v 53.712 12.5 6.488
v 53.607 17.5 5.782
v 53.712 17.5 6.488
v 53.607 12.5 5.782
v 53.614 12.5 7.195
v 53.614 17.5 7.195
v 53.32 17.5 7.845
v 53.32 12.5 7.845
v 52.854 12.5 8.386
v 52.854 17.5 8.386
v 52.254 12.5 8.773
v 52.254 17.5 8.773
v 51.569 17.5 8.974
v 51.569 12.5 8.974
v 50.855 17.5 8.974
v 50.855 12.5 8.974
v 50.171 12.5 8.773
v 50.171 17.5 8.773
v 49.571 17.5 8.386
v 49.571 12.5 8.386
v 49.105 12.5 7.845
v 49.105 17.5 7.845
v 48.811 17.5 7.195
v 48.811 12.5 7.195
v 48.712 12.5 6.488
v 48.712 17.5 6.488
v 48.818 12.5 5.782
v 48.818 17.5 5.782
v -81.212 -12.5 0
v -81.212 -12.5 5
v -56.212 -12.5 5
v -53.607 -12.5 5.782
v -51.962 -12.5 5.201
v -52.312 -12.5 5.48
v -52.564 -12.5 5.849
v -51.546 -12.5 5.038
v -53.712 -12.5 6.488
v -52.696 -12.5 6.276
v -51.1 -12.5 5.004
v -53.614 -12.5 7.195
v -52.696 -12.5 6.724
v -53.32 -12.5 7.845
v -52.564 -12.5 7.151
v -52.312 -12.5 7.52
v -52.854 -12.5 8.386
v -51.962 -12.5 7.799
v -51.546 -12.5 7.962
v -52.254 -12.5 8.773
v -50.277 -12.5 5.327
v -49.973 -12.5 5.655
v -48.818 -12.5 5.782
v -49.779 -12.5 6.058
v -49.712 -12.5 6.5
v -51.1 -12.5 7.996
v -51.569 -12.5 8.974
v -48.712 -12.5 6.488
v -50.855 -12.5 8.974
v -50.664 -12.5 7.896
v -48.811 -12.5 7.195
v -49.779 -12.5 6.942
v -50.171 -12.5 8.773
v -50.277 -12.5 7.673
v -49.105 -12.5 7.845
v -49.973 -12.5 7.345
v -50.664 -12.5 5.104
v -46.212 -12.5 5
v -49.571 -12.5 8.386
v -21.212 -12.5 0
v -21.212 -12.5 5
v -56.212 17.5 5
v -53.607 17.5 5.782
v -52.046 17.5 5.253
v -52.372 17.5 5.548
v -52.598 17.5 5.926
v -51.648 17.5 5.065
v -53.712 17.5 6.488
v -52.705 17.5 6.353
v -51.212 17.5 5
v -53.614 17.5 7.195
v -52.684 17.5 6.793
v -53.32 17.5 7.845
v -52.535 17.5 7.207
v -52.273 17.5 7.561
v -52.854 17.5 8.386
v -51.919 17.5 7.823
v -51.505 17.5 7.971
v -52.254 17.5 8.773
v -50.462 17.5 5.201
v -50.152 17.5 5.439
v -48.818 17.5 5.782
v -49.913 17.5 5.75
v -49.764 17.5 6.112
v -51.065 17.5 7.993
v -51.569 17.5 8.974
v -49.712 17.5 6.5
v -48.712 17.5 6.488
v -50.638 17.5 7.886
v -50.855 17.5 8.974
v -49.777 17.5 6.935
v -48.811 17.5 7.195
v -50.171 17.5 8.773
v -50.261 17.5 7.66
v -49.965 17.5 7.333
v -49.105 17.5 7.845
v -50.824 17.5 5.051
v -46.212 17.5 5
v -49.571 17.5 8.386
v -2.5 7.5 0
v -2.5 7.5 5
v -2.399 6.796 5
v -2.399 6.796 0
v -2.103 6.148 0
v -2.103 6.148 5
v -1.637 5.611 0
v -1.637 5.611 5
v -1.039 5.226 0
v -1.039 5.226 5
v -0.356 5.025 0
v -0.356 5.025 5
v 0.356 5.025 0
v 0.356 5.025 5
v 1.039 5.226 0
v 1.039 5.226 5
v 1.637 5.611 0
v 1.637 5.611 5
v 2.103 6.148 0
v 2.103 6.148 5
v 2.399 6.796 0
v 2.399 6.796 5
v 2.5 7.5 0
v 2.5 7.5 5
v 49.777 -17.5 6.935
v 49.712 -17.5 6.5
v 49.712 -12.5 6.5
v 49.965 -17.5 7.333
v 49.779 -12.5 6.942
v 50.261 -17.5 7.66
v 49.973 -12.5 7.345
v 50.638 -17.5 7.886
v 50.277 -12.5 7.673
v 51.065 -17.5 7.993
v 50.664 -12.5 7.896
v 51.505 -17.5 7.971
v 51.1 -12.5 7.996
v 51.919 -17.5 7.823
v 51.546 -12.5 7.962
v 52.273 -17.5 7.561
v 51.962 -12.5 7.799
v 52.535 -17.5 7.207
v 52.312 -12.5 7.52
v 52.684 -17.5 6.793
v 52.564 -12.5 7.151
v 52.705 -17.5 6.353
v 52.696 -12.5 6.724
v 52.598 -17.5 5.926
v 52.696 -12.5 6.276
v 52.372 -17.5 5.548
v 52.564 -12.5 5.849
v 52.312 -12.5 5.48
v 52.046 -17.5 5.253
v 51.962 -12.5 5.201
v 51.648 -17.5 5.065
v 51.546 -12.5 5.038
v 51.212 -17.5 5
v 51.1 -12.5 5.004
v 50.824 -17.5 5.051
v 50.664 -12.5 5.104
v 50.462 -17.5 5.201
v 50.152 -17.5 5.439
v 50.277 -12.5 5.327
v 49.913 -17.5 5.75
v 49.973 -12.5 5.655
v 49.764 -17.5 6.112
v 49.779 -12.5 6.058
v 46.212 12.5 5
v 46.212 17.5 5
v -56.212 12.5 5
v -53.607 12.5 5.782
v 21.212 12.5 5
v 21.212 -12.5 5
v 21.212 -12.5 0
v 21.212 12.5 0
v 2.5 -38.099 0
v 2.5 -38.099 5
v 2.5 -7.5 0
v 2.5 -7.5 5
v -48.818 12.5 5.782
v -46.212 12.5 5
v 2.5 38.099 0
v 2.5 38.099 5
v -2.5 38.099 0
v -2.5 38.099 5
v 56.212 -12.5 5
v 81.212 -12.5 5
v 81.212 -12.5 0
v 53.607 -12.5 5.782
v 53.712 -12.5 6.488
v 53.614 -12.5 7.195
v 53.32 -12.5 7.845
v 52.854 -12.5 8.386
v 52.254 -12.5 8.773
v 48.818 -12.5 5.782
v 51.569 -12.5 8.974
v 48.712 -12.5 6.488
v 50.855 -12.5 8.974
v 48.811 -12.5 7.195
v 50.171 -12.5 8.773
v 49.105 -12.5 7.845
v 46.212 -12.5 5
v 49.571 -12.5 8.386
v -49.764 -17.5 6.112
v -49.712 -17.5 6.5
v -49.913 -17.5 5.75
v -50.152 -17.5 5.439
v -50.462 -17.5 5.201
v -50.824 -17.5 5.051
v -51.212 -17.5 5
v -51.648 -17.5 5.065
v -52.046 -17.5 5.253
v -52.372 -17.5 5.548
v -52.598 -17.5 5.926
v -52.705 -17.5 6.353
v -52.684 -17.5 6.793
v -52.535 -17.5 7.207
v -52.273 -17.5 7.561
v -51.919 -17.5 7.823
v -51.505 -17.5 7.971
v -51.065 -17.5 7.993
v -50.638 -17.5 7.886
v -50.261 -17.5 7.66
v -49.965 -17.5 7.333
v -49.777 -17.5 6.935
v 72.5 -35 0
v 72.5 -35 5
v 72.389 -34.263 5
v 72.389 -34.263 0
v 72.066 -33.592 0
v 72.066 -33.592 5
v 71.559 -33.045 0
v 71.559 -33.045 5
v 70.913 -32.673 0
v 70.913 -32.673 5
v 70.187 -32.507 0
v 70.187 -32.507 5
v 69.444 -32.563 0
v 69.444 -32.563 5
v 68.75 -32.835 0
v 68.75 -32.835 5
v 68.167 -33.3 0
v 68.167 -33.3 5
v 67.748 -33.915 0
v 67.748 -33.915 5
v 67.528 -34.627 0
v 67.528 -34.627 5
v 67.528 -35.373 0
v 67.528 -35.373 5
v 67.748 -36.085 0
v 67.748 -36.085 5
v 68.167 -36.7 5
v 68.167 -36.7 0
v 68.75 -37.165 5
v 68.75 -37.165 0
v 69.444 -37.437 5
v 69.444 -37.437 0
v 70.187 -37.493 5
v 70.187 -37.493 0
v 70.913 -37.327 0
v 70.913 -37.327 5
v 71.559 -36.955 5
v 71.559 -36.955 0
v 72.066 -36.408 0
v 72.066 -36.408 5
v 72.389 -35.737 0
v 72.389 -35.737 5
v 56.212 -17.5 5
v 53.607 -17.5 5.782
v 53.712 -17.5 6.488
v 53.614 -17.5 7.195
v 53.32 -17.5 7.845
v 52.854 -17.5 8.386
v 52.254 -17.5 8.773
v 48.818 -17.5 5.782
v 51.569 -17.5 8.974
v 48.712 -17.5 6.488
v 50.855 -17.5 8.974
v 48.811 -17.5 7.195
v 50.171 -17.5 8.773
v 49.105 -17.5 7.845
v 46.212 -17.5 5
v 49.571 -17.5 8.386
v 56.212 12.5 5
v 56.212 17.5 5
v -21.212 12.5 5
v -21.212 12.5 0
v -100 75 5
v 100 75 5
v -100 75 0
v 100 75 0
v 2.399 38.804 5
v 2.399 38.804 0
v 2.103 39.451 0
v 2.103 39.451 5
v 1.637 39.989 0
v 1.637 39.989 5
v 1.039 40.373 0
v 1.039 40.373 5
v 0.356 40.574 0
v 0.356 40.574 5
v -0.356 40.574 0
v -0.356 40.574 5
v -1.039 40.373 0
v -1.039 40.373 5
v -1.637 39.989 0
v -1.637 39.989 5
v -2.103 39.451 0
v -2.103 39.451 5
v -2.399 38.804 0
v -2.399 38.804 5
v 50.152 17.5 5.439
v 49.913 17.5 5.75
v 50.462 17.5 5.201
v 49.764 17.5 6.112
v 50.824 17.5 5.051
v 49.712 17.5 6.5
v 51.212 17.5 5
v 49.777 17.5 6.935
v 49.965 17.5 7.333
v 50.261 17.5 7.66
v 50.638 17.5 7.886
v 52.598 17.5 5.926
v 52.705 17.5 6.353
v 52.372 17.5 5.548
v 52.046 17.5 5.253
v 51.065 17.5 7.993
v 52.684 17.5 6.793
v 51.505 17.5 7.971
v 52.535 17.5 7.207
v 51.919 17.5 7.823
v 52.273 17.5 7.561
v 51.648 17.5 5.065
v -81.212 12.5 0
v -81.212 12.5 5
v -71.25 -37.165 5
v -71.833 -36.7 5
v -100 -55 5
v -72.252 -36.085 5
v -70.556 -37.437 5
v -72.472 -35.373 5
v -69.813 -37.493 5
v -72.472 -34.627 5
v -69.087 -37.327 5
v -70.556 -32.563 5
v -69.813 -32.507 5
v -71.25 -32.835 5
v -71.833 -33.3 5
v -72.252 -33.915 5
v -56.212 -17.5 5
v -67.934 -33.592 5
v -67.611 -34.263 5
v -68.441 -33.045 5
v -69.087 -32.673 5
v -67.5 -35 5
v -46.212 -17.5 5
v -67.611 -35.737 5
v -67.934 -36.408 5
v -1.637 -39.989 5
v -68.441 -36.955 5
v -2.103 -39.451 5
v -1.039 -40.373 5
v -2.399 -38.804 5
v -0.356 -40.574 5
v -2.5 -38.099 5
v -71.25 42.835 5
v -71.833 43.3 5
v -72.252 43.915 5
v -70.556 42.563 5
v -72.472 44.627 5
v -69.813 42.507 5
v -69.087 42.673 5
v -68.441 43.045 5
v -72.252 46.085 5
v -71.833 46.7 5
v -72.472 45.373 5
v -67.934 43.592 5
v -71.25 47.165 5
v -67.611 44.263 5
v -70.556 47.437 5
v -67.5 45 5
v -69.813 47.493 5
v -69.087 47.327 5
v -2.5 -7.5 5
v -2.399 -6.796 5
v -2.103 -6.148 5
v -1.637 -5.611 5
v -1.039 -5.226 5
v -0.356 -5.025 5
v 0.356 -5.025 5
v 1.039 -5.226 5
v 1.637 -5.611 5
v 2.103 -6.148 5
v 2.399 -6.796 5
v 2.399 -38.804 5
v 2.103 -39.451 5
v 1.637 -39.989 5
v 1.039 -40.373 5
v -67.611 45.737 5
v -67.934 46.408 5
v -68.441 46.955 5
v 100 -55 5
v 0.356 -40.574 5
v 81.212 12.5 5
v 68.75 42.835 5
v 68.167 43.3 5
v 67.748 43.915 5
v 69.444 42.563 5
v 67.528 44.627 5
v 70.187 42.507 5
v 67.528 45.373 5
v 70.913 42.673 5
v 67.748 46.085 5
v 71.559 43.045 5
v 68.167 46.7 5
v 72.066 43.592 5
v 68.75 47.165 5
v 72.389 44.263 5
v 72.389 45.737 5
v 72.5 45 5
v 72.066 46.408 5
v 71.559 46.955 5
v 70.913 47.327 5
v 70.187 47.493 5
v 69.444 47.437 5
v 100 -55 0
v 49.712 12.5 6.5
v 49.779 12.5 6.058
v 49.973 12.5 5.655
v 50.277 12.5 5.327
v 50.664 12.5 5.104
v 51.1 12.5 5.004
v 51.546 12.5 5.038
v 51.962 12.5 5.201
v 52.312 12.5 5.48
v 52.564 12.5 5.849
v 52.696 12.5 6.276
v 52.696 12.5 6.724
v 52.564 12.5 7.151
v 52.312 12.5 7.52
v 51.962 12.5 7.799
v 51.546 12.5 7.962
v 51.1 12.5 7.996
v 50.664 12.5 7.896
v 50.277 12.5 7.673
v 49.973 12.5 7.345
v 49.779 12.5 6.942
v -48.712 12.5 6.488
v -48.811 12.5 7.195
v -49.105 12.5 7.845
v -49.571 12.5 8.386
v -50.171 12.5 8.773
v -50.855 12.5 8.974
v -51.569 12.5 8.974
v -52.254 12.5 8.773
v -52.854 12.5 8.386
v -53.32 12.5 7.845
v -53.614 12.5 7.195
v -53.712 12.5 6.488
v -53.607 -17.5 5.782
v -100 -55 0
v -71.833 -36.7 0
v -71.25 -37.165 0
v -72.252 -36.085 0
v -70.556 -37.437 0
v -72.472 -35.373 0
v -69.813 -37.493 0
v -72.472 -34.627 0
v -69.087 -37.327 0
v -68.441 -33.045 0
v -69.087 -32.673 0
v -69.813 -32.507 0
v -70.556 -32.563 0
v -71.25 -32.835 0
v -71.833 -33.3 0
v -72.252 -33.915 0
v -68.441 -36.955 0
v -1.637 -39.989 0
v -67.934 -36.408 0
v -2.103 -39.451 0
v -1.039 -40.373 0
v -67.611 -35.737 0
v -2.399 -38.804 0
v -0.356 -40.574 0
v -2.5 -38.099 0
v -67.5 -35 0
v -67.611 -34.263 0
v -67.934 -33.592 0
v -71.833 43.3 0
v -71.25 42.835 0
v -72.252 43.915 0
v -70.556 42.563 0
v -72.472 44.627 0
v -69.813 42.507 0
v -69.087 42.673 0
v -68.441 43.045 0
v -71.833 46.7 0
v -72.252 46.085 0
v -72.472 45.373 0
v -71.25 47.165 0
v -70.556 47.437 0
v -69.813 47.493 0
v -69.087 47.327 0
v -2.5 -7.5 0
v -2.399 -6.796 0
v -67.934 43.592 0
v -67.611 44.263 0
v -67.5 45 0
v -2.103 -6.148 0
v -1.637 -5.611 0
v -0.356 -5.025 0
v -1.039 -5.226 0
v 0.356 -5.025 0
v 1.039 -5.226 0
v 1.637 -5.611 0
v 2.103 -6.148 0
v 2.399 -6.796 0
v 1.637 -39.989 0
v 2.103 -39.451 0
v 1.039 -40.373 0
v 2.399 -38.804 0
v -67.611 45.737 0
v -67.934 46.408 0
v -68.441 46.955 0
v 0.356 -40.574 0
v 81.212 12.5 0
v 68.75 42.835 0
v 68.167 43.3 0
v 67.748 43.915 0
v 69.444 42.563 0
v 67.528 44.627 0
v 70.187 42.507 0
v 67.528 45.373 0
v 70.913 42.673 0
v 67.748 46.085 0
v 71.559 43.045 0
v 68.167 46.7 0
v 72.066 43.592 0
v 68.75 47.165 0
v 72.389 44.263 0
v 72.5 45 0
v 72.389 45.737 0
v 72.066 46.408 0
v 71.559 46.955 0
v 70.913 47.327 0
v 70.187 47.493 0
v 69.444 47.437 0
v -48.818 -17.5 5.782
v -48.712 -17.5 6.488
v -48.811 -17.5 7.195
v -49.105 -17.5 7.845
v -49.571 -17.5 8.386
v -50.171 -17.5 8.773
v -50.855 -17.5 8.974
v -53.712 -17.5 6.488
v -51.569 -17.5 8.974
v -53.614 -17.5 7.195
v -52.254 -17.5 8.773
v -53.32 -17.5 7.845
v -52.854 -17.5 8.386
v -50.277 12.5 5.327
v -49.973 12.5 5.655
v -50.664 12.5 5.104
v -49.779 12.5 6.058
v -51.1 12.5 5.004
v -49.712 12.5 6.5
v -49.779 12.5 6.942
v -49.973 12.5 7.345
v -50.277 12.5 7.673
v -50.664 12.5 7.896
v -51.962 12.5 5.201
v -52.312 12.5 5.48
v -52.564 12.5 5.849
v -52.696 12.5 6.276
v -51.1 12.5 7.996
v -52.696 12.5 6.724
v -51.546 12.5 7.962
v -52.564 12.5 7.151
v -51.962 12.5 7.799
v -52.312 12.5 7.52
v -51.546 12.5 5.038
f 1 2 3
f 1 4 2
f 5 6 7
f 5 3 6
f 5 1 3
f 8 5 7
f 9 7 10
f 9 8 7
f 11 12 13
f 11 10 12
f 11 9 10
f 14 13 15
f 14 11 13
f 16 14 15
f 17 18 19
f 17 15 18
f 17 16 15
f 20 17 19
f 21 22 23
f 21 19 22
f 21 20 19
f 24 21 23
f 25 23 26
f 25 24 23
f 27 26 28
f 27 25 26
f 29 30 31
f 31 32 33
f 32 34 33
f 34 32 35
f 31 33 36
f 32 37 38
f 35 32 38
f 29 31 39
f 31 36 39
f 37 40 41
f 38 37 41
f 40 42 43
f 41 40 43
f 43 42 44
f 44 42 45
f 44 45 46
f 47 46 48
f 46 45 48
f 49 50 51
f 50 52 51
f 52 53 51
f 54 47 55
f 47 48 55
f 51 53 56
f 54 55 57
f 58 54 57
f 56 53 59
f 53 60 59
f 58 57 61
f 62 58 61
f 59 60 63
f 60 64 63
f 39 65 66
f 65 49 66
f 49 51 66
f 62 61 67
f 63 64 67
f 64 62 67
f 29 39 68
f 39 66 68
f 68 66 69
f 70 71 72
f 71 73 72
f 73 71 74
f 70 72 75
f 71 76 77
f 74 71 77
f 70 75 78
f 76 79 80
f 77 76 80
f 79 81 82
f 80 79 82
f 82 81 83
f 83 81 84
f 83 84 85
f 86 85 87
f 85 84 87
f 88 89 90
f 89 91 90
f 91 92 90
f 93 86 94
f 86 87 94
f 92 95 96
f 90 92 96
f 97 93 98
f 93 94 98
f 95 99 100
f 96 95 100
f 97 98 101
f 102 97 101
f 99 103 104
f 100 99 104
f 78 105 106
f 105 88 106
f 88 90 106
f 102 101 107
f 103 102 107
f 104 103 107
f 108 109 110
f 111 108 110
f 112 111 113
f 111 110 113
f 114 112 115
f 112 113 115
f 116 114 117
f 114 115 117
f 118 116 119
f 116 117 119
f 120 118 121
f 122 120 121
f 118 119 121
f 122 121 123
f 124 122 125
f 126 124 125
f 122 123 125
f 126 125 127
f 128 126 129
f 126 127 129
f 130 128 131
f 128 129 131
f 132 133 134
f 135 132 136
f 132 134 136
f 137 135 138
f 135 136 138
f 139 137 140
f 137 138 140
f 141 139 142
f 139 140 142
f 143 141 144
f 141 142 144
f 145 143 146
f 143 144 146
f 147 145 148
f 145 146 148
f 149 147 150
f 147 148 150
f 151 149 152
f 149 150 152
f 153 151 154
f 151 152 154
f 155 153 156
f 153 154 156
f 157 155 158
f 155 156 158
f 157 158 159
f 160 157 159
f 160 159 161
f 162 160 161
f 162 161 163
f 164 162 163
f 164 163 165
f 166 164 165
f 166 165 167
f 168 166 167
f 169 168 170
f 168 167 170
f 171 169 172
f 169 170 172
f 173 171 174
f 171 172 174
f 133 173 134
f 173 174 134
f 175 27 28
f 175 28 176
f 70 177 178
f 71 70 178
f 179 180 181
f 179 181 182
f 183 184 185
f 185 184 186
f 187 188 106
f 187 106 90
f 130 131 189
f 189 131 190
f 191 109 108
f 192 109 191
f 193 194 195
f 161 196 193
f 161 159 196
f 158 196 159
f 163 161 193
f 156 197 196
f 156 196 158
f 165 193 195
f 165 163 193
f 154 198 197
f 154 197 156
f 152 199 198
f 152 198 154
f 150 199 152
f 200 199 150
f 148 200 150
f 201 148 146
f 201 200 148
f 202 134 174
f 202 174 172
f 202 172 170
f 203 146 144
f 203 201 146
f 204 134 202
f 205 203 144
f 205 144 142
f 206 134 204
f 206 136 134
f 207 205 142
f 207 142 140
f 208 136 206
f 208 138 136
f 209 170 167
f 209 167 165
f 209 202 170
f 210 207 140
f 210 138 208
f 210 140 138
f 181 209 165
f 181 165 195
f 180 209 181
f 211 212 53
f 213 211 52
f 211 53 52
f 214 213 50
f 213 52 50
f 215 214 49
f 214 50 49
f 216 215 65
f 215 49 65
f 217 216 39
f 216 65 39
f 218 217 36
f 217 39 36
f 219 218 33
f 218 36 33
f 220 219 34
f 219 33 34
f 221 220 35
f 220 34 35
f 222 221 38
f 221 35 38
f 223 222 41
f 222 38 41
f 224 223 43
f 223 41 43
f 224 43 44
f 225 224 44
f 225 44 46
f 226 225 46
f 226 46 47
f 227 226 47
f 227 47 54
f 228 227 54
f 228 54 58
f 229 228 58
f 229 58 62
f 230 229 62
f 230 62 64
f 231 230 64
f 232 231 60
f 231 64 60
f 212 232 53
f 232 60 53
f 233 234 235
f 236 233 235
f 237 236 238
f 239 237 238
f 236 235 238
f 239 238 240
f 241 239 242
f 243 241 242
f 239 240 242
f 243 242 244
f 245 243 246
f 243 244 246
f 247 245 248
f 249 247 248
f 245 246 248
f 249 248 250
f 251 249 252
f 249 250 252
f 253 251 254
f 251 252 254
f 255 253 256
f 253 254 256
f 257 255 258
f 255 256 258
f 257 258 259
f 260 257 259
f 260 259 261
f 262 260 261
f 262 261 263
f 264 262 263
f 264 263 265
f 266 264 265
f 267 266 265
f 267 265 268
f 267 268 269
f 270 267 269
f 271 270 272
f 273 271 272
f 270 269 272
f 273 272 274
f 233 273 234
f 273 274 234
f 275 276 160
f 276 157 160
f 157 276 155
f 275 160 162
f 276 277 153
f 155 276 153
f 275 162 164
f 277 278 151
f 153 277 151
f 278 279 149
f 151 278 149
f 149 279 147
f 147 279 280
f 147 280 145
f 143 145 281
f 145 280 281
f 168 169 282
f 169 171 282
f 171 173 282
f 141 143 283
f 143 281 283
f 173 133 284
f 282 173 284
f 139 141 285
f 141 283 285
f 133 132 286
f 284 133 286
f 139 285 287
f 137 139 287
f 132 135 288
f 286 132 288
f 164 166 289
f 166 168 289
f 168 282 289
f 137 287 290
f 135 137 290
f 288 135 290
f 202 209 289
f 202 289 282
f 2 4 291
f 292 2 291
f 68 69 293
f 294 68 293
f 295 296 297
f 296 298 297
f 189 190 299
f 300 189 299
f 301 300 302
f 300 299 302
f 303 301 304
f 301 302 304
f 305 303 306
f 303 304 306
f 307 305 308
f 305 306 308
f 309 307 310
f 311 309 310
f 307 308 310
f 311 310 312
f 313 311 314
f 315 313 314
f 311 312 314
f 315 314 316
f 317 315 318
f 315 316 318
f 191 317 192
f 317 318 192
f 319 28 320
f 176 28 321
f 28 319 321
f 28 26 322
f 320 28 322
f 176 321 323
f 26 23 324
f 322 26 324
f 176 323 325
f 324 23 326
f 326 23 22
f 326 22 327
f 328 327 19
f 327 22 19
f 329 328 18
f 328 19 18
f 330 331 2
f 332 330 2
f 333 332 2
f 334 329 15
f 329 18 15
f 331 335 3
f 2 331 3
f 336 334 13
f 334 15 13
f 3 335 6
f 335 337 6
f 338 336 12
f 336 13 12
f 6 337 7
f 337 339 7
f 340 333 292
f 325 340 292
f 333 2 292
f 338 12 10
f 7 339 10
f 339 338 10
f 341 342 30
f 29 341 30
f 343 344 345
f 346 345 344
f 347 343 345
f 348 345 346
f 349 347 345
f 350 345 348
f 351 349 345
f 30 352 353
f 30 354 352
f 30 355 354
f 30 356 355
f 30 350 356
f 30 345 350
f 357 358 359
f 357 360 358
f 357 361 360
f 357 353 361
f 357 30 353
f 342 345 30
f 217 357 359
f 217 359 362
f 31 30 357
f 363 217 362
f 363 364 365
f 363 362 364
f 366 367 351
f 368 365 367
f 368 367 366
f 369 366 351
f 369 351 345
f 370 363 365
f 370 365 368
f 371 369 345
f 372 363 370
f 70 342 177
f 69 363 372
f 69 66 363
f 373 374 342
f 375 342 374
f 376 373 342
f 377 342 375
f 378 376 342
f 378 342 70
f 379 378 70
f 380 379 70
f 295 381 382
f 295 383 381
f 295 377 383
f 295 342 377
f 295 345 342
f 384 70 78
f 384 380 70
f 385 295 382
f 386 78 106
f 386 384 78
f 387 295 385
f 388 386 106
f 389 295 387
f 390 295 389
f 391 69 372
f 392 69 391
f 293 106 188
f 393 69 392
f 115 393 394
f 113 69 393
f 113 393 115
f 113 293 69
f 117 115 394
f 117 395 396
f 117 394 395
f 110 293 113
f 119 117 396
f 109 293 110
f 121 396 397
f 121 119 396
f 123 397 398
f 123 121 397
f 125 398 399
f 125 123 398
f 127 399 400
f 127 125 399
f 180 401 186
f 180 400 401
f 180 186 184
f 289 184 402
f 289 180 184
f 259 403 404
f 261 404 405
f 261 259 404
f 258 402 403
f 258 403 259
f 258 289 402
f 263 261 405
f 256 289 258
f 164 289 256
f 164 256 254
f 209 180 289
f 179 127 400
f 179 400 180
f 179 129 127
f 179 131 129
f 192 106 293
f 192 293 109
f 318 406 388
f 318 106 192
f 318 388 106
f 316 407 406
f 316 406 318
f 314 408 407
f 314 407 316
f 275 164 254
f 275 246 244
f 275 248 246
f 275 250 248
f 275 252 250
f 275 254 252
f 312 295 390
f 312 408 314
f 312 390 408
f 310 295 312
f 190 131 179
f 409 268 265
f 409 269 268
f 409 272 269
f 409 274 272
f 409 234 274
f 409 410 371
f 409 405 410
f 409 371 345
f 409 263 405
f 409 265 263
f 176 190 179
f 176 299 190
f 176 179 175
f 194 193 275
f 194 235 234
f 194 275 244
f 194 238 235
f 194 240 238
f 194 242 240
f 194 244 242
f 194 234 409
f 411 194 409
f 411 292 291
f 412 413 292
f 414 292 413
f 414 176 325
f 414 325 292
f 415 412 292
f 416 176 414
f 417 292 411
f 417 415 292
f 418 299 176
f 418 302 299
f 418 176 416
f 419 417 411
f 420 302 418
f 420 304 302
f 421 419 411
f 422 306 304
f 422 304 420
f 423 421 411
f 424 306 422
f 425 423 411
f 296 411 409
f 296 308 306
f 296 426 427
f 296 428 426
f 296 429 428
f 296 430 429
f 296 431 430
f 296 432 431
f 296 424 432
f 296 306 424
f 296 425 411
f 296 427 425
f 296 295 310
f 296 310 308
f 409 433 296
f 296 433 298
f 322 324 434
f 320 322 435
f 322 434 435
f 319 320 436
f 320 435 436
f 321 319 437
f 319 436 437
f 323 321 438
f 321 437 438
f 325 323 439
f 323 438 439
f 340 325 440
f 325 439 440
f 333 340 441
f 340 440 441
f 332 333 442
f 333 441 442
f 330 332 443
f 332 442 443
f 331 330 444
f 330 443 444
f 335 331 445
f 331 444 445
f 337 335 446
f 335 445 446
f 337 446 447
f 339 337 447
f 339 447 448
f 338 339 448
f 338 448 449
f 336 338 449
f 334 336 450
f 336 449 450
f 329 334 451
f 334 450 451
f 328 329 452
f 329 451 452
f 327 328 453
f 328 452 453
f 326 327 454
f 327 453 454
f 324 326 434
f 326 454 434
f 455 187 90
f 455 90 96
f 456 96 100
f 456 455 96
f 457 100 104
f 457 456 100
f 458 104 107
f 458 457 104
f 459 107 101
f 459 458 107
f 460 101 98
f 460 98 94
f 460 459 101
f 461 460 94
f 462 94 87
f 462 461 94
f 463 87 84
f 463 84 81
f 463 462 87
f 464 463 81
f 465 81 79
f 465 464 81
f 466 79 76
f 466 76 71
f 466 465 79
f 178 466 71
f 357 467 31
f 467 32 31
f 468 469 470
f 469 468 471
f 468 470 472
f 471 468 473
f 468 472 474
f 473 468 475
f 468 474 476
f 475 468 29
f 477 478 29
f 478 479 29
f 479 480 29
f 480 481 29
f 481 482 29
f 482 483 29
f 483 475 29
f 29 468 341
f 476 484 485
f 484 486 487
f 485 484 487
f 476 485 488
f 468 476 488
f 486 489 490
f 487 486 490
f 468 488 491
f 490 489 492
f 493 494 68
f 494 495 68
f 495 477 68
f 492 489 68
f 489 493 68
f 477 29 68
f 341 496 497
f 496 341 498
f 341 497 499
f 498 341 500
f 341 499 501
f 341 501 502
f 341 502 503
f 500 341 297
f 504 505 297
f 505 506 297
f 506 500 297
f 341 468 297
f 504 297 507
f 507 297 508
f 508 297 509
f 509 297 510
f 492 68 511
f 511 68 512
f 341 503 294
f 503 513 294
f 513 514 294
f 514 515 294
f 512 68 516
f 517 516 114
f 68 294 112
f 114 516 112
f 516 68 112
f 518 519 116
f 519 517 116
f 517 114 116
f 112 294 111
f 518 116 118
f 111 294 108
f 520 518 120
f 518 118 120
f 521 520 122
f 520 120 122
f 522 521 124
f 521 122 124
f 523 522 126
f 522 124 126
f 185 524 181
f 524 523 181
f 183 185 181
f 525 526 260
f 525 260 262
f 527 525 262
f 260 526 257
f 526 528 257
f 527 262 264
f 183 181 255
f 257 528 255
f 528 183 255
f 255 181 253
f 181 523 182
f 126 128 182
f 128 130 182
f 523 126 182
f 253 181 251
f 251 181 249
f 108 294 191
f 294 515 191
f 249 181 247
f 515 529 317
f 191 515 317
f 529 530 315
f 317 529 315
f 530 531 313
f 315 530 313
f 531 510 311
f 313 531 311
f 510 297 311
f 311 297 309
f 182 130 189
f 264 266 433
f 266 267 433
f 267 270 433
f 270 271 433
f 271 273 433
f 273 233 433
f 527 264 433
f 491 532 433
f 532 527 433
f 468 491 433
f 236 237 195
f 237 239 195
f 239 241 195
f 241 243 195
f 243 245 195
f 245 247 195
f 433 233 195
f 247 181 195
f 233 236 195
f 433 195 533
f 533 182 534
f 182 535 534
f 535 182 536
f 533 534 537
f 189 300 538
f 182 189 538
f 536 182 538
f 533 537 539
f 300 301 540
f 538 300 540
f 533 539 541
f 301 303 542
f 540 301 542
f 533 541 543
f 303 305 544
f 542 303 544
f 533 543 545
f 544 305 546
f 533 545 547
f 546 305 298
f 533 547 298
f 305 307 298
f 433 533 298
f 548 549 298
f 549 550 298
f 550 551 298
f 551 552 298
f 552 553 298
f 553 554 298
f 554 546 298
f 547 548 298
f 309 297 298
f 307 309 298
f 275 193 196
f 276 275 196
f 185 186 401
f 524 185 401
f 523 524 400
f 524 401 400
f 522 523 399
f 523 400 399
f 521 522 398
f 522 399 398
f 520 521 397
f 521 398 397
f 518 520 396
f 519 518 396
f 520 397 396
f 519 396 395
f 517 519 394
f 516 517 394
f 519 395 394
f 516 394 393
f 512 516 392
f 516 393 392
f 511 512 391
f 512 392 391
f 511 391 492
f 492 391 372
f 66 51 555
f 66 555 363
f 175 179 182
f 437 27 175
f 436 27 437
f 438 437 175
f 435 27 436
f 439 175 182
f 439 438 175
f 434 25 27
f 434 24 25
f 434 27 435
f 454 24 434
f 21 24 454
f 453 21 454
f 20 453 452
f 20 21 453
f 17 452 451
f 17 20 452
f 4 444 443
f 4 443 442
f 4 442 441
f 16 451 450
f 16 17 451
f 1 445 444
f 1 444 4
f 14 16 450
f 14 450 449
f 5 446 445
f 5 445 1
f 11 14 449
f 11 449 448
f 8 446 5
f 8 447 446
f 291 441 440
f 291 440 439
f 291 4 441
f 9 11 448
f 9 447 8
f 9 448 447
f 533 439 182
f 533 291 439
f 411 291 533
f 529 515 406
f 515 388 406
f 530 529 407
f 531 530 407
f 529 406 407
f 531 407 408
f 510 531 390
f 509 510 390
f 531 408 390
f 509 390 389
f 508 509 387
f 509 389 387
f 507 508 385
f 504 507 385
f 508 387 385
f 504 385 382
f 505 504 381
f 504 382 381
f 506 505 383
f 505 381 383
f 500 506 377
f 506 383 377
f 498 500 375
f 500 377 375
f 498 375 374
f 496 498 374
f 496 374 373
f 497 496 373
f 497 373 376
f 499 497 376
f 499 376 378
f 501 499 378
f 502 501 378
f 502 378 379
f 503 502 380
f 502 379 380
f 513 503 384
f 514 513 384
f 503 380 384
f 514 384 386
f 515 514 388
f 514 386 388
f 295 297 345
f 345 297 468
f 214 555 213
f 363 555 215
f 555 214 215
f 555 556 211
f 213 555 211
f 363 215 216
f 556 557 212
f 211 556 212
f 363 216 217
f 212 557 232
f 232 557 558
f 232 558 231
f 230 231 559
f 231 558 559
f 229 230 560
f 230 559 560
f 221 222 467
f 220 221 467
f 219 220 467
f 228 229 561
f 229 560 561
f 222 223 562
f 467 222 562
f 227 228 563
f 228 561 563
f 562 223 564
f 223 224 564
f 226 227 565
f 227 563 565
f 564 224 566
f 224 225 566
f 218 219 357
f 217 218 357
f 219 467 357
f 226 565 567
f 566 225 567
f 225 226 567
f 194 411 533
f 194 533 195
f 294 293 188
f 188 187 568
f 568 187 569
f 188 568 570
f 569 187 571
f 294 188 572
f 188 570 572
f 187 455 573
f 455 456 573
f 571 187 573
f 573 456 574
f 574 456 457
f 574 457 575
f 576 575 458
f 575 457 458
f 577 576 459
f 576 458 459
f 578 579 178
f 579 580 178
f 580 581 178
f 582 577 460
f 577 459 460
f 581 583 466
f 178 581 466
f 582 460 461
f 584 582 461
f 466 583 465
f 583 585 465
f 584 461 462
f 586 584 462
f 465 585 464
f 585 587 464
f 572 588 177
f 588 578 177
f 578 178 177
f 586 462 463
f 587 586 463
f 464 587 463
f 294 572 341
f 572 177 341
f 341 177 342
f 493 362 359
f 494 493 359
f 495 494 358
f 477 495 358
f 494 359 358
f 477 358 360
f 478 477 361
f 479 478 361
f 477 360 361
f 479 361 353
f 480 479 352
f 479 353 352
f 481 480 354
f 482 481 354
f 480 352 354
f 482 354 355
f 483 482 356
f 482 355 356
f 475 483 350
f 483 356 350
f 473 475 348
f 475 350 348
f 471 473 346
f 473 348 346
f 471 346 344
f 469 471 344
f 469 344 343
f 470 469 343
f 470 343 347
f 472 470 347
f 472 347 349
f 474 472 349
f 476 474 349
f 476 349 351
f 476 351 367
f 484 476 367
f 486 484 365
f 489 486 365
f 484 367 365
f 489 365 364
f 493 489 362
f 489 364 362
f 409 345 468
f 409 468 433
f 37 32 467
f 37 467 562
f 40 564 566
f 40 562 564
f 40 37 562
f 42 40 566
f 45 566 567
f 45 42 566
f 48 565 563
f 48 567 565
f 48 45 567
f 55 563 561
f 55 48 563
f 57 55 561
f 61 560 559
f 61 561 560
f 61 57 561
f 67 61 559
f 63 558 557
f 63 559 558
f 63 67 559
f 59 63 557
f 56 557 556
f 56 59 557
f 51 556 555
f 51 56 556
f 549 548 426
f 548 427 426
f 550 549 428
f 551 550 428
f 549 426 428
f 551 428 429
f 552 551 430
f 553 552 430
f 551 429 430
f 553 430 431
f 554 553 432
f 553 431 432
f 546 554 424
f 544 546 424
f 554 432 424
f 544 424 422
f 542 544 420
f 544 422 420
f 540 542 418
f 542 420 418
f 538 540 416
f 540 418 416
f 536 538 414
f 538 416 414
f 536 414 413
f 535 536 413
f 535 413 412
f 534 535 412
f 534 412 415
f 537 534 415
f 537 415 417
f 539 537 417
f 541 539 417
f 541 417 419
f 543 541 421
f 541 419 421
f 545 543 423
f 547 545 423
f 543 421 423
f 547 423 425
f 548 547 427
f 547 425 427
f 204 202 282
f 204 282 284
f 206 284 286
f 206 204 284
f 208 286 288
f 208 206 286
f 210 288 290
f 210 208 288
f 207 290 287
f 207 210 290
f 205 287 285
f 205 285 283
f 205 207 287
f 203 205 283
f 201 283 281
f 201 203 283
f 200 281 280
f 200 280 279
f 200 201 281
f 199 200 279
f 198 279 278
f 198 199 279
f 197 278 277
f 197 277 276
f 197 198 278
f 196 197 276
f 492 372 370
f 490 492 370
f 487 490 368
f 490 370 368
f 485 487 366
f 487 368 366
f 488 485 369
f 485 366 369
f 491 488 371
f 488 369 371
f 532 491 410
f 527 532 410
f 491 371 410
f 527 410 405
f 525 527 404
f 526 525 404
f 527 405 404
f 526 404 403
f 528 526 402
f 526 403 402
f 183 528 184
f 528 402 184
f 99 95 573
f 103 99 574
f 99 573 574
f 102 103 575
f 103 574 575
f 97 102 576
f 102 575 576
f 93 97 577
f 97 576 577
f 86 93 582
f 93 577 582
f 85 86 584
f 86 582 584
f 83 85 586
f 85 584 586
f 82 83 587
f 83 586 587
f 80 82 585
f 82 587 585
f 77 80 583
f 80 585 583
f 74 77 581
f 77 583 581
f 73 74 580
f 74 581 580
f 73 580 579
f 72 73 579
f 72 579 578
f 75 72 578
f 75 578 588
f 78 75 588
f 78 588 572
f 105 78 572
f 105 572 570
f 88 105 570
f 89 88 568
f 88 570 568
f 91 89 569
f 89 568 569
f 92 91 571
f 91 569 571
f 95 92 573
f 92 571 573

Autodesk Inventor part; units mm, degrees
ref_plane "YZ Plane" through (0, 0, 0) normal (1, 0, 0) x (0, 1, 0)
ref_plane "XZ Plane" through (0, 0, 0) normal (0, 1, 0) x (-1, 0, 0)
sketch "Эскиз1" plane through (0, 0, 0) normal (0, 0, 1) x (1, 0, 0)
  line L0 (-100, -75) -> (100, -75)
  line L1 (100, -75) -> (100, 75)
  line L2 (100, 75) -> (-100, 75)
  line L3 (-100, 75) -> (-100, -75)
  line L4 (-100, -75) -> (100, 75) construction
  line L5 (100, -75) -> (-100, 75) construction
  point P0 (0, 0)
  dimension "d0" = 200
  dimension "d1" = 150
extrude "Выдавливание1" add sketch "Эскиз1" along normal blind 5
sketch "Эскиз2" plane through (0, 0, 5) normal (0, 0, 1) x (1, 0, 0)
  line L0 (-100, -75) -> (100, -75) projected
  line L1 (100, -75) -> (100, 75) projected
  line L2 (100, 75) -> (-100, 75) projected
  line L3 (-100, 75) -> (-100, -75) projected
  line L4 (100, 75) -> (-100, 75) construction
  line L5 (0, 75) -> (0, -75) construction
  line L6 (-100, 0) -> (100, 0) construction
  line L7 (100, -75) -> (100, 75) construction
  line L8 (-100, -12.5) -> (100, -12.5) construction
  line L9 (100, -12.5) -> (100, 12.5) construction
  line L10 (100, 12.5) -> (-100, 12.5) construction
  line L11 (-100, 12.5) -> (-100, -12.5) construction
  line L12 (-100, -12.5) -> (100, 12.5) construction
  line L13 (100, -12.5) -> (-100, 12.5) construction
  line L14 (-100, 0) -> (0, 0) construction
  line L15 (-51.2124, 75) -> (-51.2124, -75) construction
  line L16 (-100, -75) -> (100, -75) construction
  line L17 (0, 0) -> (100, 0) construction
  line L18 (50, 75) -> (50, -75) construction
  line L19 (-81.2124, -12.5) -> (-21.2124, -12.5)
  line L20 (-21.2124, -12.5) -> (-21.2124, 12.5)
  line L21 (-21.2124, 12.5) -> (-81.2124, 12.5)
  line L22 (-81.2124, 12.5) -> (-81.2124, -12.5)
  line L23 (-81.2124, -12.5) -> (-21.2124, 12.5) construction
  line L24 (-21.2124, -12.5) -> (-81.2124, 12.5) construction
  line L25 (81.2124, -12.5) -> (21.2124, -12.5)
  line L26 (21.2124, -12.5) -> (21.2124, 12.5)
  line L27 (21.2124, 12.5) -> (81.2124, 12.5)
  line L28 (81.2124, 12.5) -> (81.2124, -12.5)
  point P0 (-51.2124, 0)
  dimension "d4" = 25
  dimension "d5" = 60
extrude "Выдавливание2" cut sketch "Эскиз2" against normal blind 5 contours L22 L21 L20 L19 | L25 L26 L27 L28
sketch "Эскиз3" plane through (-81.2124, 12.5, 5) normal (0, -1, 0) x (1, 0, 0)
  line L0 (0, 0) -> (60, 0) projected
  line L1 (30, 0) -> (30, 14.9537) construction
  line L2 (30, 0) -> (40, 0) construction
  line L3 (30, 0) -> (35, 0) construction
  line L4 (30, 0) -> (25, 0) construction
  line L5 (25, 0) -> (35, 0) construction
  line L6 (25, 0) -> (35, 0)
  line L7 (30, 0) -> (30, 3) construction
  circle A0 centre (30, 1.5) radius 1.5
  arc A1 (32.3946, 0.7816) -> (27.6054, 0.7816) centre (30, 1.5) ccw
  line L8 (35, 0) -> (32.3946, 0.7816)
  line L9 (25, 0) -> (27.6054, 0.7816)
  point P0 (81.2124, -5)
  dimension "d8" = 10
  dimension "d9" = 5
  dimension "d10" = 5
  dimension "d11" = 3
  dimension "d12" = 1
extrude "Выдавливание3" add sketch "Эскиз3" against normal blind 5
mirror "Зеркальное отражение1" about plane through (0, 0, 0) normal (0, 1, 0) of "Выдавливание3"
sketch "Эскиз4" plane through (-81.2124, 12.5, 0) normal (0, -1, 0) x (1, 0, 0)
  circle A0 centre (30, 6.5) radius 1.5 projected
  point P0 (81.2124, 0)
surface extrude "ВыдавПврх1" sketch "Эскиз4" along normal up to next shown yes curves A0
boundary_patch "Участок поверхности1"
boundary_patch "Участок поверхности2"
ref_plane "РабПлоскость1" through (-81.2124, 0, 0) normal (0, -1, 0) x (1, 0, 0)
sketch "Эскиз6" plane through (0, 0, 5) normal (0, 0, 1) x (1, 0, 0)
  line L0 (81.2124, -12.5) -> (21.2124, -12.5) projected
  line L1 (21.2124, -12.5) -> (21.2124, 12.5) projected
  line L2 (21.2124, 12.5) -> (81.2124, 12.5) projected
  line L3 (81.2124, 12.5) -> (81.2124, -12.5) projected
  line L4 (-100, -75) -> (100, -75) projected
  line L5 (100, -75) -> (100, 75) projected
  line L6 (100, 75) -> (-100, 75) projected
  line L7 (-100, 75) -> (-100, -75) projected
  line L8 (-46.2124, -12.5) -> (-46.2124, -17.5) projected
  line L9 (-46.2124, -17.5) -> (-51.2124, -17.5) projected
  line L10 (-51.2124, -17.5) -> (-56.2124, -17.5) projected
  line L11 (-56.2124, -17.5) -> (-56.2124, -12.5) projected
  line L12 (-56.2124, -12.5) -> (-81.2124, -12.5) projected
  line L13 (-81.2124, -12.5) -> (-81.2124, 12.5) projected
  line L14 (-81.2124, 12.5) -> (-56.2124, 12.5) projected
  line L15 (-56.2124, 12.5) -> (-56.2124, 17.5) projected
  line L16 (-56.2124, 17.5) -> (-51.2124, 17.5) projected
  line L17 (-51.2124, 17.5) -> (-46.2124, 17.5) projected
  line L18 (-46.2124, 17.5) -> (-46.2124, 12.5) projected
  line L19 (-46.2124, 12.5) -> (-21.2124, 12.5) projected
  line L20 (-21.2124, 12.5) -> (-21.2124, -12.5) projected
  line L21 (-21.2124, -12.5) -> (-46.2124, -12.5) projected
  line L22 (-100, -75) -> (100, -75) construction
  line L23 (-21.2124, -75) -> (-21.2124, 75) construction
  line L24 (100, 75) -> (-100, 75) construction
  line L25 (-21.2124, 12.5) -> (-21.2124, 75) construction
  line L26 (-21.2124, 75) -> (21.2124, 75) construction
  line L27 (21.2124, 75) -> (21.2124, 12.5) construction
  line L28 (21.2124, 12.5) -> (-21.2124, 12.5) construction
  line L29 (-21.2124, 12.5) -> (-21.2124, 75) construction
  line L30 (-21.2124, -75) -> (21.2124, -75) construction
  line L31 (21.2124, -75) -> (21.2124, -12.5) construction
  line L32 (21.2124, -12.5) -> (-21.2124, -12.5) construction
  line L33 (-21.2124, -12.5) -> (-21.2124, -75) construction
  line L34 (100, -75) -> (100, 75) construction
  line L35 (-100, -7.5) -> (100, -7.5) construction
  line L36 (100, -7.5) -> (100, 7.5) construction
  line L37 (100, 7.5) -> (-100, 7.5) construction
  line L38 (-100, 7.5) -> (-100, -7.5) construction
  line L39 (-100, -7.5) -> (100, 7.5) construction
  line L40 (100, -7.5) -> (-100, 7.5) construction
  line L41 (0, 7.5) -> (0, 17.5) construction
  line L42 (0, -7.5) -> (0, -28.0993) construction
  line L43 (-2.5, -7.5) -> (-2.5, -28.0993)
  line L44 (2.5, -28.0993) -> (2.5, -7.5)
  arc A0 (2.5, -7.5) -> (-2.5, -7.5) centre (0, -7.5) ccw
  line L45 (-2.5, -28.0993) -> (-2.5, -38.0993)
  line L46 (2.5, -28.0993) -> (2.5, -38.0993)
  arc A1 (-2.5, -38.0993) -> (2.5, -38.0993) centre (0, -38.0993) ccw
  line L47 (-21.2124, 0) -> (21.2124, 0) construction
  line L48 (-2.5, 7.5) -> (-2.5, 28.0993)
  line L49 (2.5, 28.0993) -> (2.5, 7.5)
  arc A2 (-2.5, 7.5) -> (2.5, 7.5) centre (0, 7.5) ccw
  line L50 (-2.5, 28.0993) -> (-2.5, 38.0993)
  line L51 (2.5, 28.0993) -> (2.5, 38.0993)
  arc A3 (2.5, 38.0993) -> (-2.5, 38.0993) centre (0, 38.0993) ccw
  point P0 (0, 0)
  point P1 (0, -17.7997)
  point P2 (0, 17.7997)
  dimension "d24" = 15
  dimension "d25" = 10
  dimension "d27" = 10
extrude "Выдавливание5" cut sketch "Эскиз6" against normal blind 20 contours A0 L44 L46 A1 L45 L43 | L48 L50 A3 L51 L49 A2
mirror "Зеркальное отражение2" about plane through (0, 0, 0) normal (1, 0, 0) of "Выдавливание3", "ВыдавПврх1", "Зеркальное отражение1"
sketch "Эскиз7" plane through (0, 0, 5) normal (0, 0, 1) x (1, 0, 0)
  arc A0 (-2.5, -38.0993) -> (2.5, -38.0993) centre (0, -38.0993) ccw projected
  line L0 (-2.5, -38.0993) -> (-2.5, -7.5) projected
  arc A1 (2.5, -7.5) -> (-2.5, -7.5) centre (0, -7.5) ccw projected
  line L1 (2.5, -7.5) -> (2.5, -38.0993) projected
  arc A2 (2.5, 38.0993) -> (-2.5, 38.0993) centre (0, 38.0993) ccw projected
  line L2 (2.5, 38.0993) -> (2.5, 7.5) projected
  arc A3 (-2.5, 7.5) -> (2.5, 7.5) centre (0, 7.5) ccw projected
  line L3 (-2.5, 7.5) -> (-2.5, 38.0993) projected
  line L4 (-100, -75) -> (100, -75) projected
  line L5 (100, -75) -> (100, 75) projected
  line L6 (100, 75) -> (-100, 75) projected
  line L7 (-100, 75) -> (-100, -75) projected
  line L8 (-46.2124, -12.5) -> (-46.2124, -17.5) projected
  line L9 (-46.2124, -17.5) -> (-51.2124, -17.5) projected
  line L10 (-51.2124, -17.5) -> (-56.2124, -17.5) projected
  line L11 (-56.2124, -17.5) -> (-56.2124, -12.5) projected
  line L12 (-56.2124, -12.5) -> (-81.2124, -12.5) projected
  line L13 (-81.2124, -12.5) -> (-81.2124, 12.5) projected
  line L14 (-81.2124, 12.5) -> (-56.2124, 12.5) projected
  line L15 (-56.2124, 12.5) -> (-56.2124, 17.5) projected
  line L16 (-56.2124, 17.5) -> (-51.2124, 17.5) projected
  line L17 (-51.2124, 17.5) -> (-46.2124, 17.5) projected
  line L18 (-46.2124, 17.5) -> (-46.2124, 12.5) projected
  line L19 (-46.2124, 12.5) -> (-21.2124, 12.5) projected
  line L20 (-21.2124, 12.5) -> (-21.2124, -12.5) projected
  line L21 (-21.2124, -12.5) -> (-46.2124, -12.5) projected
  line L22 (56.2124, -12.5) -> (56.2124, -17.5) projected
  line L23 (56.2124, -17.5) -> (51.2124, -17.5) projected
  line L24 (51.2124, -17.5) -> (46.2124, -17.5) projected
  line L25 (46.2124, -17.5) -> (46.2124, -12.5) projected
  line L26 (46.2124, -12.5) -> (21.2124, -12.5) projected
  line L27 (21.2124, -12.5) -> (21.2124, 12.5) projected
  line L28 (21.2124, 12.5) -> (46.2124, 12.5) projected
  line L29 (46.2124, 12.5) -> (46.2124, 17.5) projected
  line L30 (46.2124, 17.5) -> (51.2124, 17.5) projected
  line L31 (51.2124, 17.5) -> (56.2124, 17.5) projected
  line L32 (56.2124, 17.5) -> (56.2124, 12.5) projected
  line L33 (56.2124, 12.5) -> (81.2124, 12.5) projected
  line L34 (81.2124, 12.5) -> (81.2124, -12.5) projected
  line L35 (81.2124, -12.5) -> (56.2124, -12.5) projected
  line L36 (-100, 75) -> (-70, 75) construction
  line L37 (-70, 75) -> (-70, 45) construction
  line L38 (-70, 45) -> (-100, 45) construction
  line L39 (-100, 45) -> (-100, 75) construction
  circle A4 centre (-70, 45) radius 2.5
  line L40 (100, -75) -> (100, 75) construction
  line L41 (100, 0) -> (-100, 0) construction
  line L42 (100, 75) -> (-100, 75) construction
  line L43 (0, 75) -> (0, -75) construction
  line L44 (-100, -75) -> (100, -75) construction
  circle A5 centre (70, 45) radius 2.5
  line L45 (-100, -75) -> (100, -75) projected
  line L46 (-70, -75) -> (-70, -35) construction
  line L47 (-70, -35) -> (-100, -35) construction
  circle A6 centre (-70, -35) radius 2.5
  line L48 (70, -75) -> (70, -35) construction
  line L49 (70, -35) -> (100, -35) construction
  circle A7 centre (70, -35) radius 2.5
  line L50 (-100, -75) -> (-100, -55)
  line L51 (-100, -55) -> (100, -55)
  line L52 (100, -75) -> (100, -55)
  point P0 (0, 0)
  dimension "d30" = 30
  dimension "d31" = 30
  dimension "d32" = 5
  dimension "d35" = 40
  dimension "d36" = 5
  dimension "d37" = 20
extrude "Выдавливание6" cut sketch "Эскиз7" against normal blind 20 contours L7 L51 L5 L4 | A4 | A5 | A6 | A7
properties part number "Down"
